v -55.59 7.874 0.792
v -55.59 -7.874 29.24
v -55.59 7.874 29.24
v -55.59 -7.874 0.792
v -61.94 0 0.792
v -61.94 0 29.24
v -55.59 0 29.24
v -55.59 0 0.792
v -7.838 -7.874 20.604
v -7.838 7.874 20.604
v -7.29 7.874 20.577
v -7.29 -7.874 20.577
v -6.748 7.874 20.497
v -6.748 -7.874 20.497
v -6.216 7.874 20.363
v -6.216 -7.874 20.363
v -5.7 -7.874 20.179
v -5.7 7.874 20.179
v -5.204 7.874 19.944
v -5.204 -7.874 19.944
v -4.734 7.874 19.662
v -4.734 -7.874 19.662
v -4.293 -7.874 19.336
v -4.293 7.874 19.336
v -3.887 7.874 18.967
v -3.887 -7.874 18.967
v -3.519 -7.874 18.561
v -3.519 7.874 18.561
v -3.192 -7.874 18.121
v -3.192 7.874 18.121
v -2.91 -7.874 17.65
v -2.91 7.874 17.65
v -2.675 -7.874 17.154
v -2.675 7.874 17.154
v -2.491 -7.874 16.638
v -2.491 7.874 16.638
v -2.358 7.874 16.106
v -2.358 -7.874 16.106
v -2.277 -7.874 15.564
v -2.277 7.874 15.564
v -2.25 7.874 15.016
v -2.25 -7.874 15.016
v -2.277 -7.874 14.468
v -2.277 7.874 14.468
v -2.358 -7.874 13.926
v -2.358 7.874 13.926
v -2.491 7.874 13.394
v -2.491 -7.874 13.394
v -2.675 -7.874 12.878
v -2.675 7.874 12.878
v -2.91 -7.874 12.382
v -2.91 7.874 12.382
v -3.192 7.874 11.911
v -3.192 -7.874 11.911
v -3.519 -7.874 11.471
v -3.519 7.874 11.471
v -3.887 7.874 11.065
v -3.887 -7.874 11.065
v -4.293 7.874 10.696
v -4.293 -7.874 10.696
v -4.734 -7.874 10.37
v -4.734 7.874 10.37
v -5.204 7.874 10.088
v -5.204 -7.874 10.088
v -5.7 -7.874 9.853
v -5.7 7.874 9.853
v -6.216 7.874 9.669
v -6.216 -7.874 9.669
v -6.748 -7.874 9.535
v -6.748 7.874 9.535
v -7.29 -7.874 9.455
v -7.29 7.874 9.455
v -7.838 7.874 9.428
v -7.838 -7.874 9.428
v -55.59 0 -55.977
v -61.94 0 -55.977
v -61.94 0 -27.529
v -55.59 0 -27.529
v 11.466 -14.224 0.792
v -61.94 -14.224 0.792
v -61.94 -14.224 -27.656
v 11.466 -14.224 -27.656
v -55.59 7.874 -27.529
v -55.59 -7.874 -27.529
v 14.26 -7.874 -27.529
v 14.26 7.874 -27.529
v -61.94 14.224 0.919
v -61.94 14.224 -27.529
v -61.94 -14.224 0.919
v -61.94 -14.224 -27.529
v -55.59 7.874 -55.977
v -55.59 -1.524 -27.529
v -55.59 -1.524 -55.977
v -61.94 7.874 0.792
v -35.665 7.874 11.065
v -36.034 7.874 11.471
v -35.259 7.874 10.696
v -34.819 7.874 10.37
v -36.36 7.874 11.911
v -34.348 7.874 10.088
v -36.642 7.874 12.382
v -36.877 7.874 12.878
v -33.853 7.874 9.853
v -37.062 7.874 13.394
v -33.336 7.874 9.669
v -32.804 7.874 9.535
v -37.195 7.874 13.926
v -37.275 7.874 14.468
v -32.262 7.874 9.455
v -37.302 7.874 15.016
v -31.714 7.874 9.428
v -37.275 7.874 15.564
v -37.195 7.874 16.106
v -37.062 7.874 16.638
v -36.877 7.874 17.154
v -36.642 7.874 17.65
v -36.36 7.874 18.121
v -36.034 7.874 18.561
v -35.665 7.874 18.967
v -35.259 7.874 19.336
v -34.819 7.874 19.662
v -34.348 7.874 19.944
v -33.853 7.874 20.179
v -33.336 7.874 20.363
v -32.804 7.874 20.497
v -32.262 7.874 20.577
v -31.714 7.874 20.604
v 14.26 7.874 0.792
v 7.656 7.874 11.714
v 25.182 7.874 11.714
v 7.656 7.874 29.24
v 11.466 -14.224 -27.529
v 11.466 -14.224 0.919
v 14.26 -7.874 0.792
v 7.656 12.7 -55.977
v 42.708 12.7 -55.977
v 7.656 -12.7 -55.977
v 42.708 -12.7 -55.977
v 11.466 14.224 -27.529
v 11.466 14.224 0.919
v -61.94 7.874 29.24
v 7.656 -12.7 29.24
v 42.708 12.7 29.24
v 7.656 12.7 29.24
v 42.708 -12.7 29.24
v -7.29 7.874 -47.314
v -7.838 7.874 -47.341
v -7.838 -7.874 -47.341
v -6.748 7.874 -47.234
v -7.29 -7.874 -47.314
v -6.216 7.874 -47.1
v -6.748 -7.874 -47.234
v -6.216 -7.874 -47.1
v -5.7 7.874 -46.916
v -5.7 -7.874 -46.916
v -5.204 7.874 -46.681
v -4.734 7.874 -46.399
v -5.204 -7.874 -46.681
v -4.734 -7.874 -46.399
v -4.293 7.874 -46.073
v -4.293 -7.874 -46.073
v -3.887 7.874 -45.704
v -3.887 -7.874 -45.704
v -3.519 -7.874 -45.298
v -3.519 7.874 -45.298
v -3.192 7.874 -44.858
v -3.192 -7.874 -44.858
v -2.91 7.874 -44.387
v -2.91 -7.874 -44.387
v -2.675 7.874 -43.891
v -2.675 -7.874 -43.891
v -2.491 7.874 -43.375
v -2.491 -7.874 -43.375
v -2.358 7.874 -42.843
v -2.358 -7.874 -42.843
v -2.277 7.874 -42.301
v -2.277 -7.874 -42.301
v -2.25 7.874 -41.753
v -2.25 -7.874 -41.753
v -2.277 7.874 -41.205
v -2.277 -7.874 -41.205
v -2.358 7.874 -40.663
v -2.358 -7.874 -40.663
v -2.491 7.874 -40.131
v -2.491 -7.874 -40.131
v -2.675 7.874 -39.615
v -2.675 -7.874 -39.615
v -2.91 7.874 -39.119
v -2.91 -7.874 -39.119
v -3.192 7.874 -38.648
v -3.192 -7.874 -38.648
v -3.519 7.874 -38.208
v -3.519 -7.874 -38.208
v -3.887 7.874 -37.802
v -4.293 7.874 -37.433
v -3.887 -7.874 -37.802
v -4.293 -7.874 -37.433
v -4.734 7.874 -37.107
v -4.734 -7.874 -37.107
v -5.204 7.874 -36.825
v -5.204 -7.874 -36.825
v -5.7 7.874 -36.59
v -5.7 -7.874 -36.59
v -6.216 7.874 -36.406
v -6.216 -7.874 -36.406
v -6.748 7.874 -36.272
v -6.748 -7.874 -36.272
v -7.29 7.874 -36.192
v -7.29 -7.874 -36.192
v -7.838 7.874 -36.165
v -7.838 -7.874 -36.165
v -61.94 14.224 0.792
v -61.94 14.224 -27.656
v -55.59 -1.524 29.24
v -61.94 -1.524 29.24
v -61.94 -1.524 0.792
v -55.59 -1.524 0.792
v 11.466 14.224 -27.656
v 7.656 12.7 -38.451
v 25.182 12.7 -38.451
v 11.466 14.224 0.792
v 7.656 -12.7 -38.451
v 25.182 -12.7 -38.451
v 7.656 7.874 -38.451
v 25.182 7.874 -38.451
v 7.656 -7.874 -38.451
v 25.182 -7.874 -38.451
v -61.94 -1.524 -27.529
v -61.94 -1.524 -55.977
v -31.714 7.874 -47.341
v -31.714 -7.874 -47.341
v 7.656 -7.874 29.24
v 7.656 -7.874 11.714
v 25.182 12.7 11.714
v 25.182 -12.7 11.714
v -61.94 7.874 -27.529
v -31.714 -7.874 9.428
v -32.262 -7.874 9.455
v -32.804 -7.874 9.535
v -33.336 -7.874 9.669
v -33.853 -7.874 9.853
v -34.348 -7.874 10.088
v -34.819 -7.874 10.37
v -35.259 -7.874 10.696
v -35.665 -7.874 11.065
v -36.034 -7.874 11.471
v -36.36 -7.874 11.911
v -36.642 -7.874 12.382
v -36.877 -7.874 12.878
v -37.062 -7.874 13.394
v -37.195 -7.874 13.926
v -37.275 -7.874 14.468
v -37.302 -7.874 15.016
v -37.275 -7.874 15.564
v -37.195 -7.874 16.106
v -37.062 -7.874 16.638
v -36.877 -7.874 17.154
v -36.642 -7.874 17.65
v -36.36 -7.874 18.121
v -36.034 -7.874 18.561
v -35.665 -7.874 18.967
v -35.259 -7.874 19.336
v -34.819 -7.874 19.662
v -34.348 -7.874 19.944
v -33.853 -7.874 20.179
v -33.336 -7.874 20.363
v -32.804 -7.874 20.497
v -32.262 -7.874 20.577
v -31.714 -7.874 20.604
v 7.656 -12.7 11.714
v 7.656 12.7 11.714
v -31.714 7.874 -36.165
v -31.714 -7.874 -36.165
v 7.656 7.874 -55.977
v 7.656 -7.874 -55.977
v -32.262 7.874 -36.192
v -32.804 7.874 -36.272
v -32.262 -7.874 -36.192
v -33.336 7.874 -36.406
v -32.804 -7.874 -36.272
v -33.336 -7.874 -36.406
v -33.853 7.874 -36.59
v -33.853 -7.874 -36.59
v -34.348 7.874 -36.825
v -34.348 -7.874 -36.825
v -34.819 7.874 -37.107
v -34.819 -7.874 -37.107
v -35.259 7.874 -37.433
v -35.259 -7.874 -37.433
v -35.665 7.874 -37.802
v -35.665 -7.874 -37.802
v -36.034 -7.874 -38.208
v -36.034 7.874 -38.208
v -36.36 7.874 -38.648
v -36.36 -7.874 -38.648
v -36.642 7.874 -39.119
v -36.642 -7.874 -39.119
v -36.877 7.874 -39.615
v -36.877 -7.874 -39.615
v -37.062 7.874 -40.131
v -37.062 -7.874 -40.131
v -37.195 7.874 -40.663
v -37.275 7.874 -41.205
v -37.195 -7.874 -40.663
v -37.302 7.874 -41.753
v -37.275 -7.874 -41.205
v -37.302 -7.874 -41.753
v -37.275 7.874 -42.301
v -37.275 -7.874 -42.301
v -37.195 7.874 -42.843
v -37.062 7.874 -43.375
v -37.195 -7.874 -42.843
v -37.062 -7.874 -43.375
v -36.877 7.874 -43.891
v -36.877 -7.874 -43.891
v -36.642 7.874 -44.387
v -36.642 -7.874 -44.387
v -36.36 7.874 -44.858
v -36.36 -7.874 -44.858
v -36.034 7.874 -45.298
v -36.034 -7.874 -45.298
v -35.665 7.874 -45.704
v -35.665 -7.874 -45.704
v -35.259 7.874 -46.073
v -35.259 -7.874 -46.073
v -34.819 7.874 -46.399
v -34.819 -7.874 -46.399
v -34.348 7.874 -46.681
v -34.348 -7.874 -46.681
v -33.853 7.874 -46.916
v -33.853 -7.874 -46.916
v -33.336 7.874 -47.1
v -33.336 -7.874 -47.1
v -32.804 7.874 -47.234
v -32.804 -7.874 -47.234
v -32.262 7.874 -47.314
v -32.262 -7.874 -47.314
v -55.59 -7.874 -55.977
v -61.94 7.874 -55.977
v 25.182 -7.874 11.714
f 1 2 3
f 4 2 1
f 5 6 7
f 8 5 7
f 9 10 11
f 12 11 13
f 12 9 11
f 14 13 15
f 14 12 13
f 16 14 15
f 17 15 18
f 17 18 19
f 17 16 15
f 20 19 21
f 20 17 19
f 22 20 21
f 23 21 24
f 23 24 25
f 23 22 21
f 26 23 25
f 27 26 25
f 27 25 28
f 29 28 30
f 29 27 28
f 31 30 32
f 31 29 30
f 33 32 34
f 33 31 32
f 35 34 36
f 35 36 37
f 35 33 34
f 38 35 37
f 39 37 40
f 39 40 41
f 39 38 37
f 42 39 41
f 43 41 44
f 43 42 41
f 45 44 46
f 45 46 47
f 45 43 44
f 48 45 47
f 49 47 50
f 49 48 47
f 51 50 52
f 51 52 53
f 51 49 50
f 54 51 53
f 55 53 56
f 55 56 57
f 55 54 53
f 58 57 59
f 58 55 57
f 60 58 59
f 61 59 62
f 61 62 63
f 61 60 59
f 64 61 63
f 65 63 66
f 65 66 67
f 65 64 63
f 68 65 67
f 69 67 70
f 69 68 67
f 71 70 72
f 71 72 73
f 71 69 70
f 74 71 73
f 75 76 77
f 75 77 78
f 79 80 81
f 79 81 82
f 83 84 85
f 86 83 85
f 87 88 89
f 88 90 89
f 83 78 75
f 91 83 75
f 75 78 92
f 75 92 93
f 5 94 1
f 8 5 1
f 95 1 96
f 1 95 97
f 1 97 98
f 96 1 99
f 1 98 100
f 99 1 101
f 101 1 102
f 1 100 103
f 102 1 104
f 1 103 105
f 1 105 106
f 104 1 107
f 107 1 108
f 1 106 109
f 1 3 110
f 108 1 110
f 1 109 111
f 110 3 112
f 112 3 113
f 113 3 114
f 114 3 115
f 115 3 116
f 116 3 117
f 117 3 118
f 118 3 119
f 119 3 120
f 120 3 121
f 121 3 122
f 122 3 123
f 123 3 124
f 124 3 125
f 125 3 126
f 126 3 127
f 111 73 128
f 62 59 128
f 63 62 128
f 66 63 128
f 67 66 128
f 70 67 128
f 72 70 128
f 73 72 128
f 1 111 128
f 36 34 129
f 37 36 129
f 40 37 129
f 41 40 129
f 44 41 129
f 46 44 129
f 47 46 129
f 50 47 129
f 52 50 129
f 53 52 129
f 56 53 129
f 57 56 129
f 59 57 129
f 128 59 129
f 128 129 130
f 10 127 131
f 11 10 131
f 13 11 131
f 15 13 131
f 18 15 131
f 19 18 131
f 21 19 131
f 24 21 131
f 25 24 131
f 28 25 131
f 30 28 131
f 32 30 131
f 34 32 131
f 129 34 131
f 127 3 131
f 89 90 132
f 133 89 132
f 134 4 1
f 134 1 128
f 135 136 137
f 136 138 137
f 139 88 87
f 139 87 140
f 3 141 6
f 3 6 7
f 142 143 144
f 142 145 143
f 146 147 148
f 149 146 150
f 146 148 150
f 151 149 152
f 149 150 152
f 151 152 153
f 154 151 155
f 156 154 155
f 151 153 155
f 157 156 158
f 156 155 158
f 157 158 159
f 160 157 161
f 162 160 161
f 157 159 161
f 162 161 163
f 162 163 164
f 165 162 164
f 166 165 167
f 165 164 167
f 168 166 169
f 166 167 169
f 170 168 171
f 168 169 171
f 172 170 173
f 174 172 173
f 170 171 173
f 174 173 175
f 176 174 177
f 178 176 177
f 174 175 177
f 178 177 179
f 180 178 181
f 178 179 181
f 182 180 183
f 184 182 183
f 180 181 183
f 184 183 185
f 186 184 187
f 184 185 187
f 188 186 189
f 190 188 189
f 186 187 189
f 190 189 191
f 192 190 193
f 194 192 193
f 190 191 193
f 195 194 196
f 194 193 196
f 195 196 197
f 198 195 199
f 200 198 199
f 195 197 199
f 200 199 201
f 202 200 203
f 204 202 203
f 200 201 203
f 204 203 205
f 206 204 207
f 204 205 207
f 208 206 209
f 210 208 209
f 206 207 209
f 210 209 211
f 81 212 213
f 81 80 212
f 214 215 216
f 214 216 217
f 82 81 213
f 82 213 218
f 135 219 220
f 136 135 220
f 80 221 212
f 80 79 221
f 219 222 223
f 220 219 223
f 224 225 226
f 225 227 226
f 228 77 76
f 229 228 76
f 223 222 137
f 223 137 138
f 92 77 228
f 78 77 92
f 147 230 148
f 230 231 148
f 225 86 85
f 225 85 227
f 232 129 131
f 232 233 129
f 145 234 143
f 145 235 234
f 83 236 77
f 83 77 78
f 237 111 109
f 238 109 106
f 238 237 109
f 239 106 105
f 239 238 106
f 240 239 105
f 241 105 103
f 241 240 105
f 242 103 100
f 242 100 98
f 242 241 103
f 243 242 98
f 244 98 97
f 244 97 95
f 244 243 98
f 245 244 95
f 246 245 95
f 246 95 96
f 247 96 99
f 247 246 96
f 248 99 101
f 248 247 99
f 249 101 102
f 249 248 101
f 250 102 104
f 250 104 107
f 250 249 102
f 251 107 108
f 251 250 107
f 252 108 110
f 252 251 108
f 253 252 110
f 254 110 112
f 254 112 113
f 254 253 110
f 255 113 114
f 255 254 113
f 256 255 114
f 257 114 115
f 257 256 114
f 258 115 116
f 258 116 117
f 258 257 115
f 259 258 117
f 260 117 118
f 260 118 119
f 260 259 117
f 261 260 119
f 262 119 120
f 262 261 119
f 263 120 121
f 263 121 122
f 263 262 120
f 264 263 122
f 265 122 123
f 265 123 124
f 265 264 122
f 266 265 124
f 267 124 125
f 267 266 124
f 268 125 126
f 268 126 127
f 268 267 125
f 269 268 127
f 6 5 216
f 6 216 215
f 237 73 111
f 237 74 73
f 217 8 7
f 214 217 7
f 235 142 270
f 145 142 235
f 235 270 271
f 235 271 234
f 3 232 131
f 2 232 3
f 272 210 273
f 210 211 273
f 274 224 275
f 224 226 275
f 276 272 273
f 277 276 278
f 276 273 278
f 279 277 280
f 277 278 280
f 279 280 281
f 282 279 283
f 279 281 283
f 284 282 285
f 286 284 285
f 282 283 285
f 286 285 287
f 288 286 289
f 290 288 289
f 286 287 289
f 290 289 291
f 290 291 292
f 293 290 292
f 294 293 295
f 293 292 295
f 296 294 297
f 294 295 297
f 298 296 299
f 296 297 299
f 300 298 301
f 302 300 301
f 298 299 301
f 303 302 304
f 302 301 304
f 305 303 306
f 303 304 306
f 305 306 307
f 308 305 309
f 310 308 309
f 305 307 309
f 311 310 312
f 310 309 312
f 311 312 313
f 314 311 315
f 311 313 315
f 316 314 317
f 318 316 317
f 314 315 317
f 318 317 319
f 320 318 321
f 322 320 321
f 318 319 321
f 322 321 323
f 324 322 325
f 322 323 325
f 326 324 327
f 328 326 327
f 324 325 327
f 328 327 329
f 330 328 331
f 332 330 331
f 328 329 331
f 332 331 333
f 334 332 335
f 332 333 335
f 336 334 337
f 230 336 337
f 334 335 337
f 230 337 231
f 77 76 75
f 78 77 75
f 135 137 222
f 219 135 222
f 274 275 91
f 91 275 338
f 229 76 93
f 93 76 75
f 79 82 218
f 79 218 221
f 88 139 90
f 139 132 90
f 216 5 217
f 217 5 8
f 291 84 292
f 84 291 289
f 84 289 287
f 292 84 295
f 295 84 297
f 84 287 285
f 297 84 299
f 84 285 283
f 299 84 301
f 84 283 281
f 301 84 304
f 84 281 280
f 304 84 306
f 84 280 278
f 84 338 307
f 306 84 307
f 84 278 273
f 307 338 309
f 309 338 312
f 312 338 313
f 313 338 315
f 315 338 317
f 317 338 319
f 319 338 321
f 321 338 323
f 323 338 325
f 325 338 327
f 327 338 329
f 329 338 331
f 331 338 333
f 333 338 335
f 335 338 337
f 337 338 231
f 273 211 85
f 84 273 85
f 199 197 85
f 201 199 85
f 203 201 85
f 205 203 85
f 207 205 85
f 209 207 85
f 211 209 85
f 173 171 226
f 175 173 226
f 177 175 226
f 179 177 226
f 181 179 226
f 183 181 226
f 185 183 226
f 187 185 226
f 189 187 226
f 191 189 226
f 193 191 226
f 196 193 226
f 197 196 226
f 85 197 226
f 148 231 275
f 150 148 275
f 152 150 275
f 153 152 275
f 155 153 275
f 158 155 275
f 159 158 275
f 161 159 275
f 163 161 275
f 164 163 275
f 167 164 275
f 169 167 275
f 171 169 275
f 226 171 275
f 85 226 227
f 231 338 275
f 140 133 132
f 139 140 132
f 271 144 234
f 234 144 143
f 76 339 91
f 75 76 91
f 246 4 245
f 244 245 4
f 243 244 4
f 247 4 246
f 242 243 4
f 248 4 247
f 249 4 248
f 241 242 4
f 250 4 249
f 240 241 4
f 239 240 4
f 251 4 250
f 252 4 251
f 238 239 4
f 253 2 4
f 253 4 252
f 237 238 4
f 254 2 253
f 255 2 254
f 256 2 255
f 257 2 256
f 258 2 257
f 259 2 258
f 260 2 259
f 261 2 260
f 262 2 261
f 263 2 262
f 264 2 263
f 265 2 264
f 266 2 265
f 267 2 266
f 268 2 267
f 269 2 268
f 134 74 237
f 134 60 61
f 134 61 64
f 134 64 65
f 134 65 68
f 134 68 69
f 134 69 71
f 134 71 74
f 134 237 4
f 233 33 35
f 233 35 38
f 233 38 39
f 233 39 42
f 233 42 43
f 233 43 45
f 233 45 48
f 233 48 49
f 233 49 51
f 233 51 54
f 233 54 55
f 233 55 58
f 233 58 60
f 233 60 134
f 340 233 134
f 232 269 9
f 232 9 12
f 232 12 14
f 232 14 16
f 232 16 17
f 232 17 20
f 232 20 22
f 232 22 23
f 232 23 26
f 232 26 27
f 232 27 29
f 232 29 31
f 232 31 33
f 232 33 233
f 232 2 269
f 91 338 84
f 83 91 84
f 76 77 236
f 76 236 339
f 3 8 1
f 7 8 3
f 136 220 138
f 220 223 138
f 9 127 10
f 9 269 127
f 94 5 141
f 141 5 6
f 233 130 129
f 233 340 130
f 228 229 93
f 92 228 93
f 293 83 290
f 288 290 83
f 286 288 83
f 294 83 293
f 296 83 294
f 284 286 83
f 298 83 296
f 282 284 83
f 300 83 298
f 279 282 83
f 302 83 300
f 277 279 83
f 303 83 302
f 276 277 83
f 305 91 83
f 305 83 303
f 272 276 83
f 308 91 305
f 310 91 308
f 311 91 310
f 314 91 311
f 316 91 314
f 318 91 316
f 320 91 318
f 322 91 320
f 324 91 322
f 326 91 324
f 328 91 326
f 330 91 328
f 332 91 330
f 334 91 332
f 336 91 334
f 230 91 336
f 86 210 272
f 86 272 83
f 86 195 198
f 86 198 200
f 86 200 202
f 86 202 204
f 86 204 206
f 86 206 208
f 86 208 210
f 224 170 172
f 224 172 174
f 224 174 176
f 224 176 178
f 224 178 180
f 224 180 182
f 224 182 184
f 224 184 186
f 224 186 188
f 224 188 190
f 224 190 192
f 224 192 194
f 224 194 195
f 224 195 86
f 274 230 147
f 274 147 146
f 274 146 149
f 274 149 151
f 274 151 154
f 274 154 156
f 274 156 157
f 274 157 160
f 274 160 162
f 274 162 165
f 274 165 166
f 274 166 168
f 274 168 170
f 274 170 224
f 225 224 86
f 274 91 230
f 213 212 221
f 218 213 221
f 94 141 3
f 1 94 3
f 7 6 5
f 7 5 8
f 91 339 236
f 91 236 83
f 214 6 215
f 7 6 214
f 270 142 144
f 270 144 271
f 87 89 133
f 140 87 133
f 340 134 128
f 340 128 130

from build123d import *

# Parameters (mm, degrees)
F1_DEPTH = 12.7
F2_DEPTH = 14.224
F3_DEPTH = 7.874
F0_W     = 6.35
F0_H     = 28.448
F4_DEPTH = 7.874
F5_DEPTH = 1.524


with BuildPart() as f1:
    # F0 (on Front) → F1 (new body, symmetric)
    with BuildSketch(Plane.XZ):
        Polygon((42.707863, 29.239993), (7.655863, 29.239993), (7.655863, 11.713993), (25.181863, 11.713993), align=None)
    extrude(amount=F1_DEPTH, both=True)


with BuildPart() as f2:
    # F0 (on Front) → F2 (new body, symmetric)
    with BuildSketch(Plane.XZ):
        Polygon((-55.590137, 0.791993), (-61.940137, 0.791993), (-61.940137, -27.656007), (11.465863, -27.656007), (11.465863, 0.791993), align=None)
    extrude(amount=F2_DEPTH, both=True)


with BuildPart() as f3:
    # F0 (on Front) → F3 (new body, symmetric)
    with BuildSketch(Plane.XZ):
        Polygon((7.655863, 29.239993), (-55.590137, 29.239993), (-55.590137, 0.791993), (11.465863, 0.791993), (14.259863, 0.791993), (25.181863, 11.713993), (7.655863, 11.713993), align=None)
        with BuildLine():
            ThreePointArc((-31.714137, 9.427993), (-37.302137, 15.015993), (-31.714137, 20.603993))
            Line((-31.714137, 20.603993), (-7.838137, 20.603993))
            ThreePointArc((-7.838137, 20.603993), (-2.250137, 15.015993), (-7.838137, 9.427993))
            Line((-7.838137, 9.427993), (-31.714137, 9.427993))
        make_face(mode=Mode.SUBTRACT)
    extrude(amount=F3_DEPTH, both=True)


with BuildPart() as f4:
    # F0 (on Front) → F4 (new body)
    with BuildSketch(Plane.XZ):
        with Locations((-58.765137, 15.015993)):
            Rectangle(F0_W, F0_H)
    extrude(amount=-F4_DEPTH)


with BuildPart() as f5:
    # F0 (on Front) → F5 (new body)
    with BuildSketch(Plane.XZ):
        with Locations((-58.765137, 15.015993)):
            Rectangle(F0_W, F0_H)
    extrude(amount=F5_DEPTH)


with BuildPart() as f7_1:
    # F7: instance of F3
    add(f3.part.mirror(Plane(origin=(-25.237137, 0, -13.368507), x_dir=(1, 0, 0), z_dir=(0, 0, -1))))


with BuildPart() as f7_2:
    # F7: instance of F4
    add(f4.part.mirror(Plane(origin=(-25.237137, 0, -13.368507), x_dir=(1, 0, 0), z_dir=(0, 0, -1))))


with BuildPart() as f7_3:
    # F7: instance of F5
    add(f5.part.mirror(Plane(origin=(-25.237137, 0, -13.368507), x_dir=(1, 0, 0), z_dir=(0, 0, -1))))


with BuildPart() as f7_4:
    # F7: instance of F2
    add(f2.part.mirror(Plane(origin=(-25.237137, 0, -13.368507), x_dir=(1, 0, 0), z_dir=(0, 0, -1))))


with BuildPart() as f7_5:
    # F7: instance of F1
    add(f1.part.mirror(Plane(origin=(-25.237137, 0, -13.368507), x_dir=(1, 0, 0), z_dir=(0, 0, -1))))


solid = Compound([f1.part, f2.part, f3.part, f4.part, f5.part, f7_1.part, f7_2.part, f7_3.part, f7_4.part, f7_5.part])
